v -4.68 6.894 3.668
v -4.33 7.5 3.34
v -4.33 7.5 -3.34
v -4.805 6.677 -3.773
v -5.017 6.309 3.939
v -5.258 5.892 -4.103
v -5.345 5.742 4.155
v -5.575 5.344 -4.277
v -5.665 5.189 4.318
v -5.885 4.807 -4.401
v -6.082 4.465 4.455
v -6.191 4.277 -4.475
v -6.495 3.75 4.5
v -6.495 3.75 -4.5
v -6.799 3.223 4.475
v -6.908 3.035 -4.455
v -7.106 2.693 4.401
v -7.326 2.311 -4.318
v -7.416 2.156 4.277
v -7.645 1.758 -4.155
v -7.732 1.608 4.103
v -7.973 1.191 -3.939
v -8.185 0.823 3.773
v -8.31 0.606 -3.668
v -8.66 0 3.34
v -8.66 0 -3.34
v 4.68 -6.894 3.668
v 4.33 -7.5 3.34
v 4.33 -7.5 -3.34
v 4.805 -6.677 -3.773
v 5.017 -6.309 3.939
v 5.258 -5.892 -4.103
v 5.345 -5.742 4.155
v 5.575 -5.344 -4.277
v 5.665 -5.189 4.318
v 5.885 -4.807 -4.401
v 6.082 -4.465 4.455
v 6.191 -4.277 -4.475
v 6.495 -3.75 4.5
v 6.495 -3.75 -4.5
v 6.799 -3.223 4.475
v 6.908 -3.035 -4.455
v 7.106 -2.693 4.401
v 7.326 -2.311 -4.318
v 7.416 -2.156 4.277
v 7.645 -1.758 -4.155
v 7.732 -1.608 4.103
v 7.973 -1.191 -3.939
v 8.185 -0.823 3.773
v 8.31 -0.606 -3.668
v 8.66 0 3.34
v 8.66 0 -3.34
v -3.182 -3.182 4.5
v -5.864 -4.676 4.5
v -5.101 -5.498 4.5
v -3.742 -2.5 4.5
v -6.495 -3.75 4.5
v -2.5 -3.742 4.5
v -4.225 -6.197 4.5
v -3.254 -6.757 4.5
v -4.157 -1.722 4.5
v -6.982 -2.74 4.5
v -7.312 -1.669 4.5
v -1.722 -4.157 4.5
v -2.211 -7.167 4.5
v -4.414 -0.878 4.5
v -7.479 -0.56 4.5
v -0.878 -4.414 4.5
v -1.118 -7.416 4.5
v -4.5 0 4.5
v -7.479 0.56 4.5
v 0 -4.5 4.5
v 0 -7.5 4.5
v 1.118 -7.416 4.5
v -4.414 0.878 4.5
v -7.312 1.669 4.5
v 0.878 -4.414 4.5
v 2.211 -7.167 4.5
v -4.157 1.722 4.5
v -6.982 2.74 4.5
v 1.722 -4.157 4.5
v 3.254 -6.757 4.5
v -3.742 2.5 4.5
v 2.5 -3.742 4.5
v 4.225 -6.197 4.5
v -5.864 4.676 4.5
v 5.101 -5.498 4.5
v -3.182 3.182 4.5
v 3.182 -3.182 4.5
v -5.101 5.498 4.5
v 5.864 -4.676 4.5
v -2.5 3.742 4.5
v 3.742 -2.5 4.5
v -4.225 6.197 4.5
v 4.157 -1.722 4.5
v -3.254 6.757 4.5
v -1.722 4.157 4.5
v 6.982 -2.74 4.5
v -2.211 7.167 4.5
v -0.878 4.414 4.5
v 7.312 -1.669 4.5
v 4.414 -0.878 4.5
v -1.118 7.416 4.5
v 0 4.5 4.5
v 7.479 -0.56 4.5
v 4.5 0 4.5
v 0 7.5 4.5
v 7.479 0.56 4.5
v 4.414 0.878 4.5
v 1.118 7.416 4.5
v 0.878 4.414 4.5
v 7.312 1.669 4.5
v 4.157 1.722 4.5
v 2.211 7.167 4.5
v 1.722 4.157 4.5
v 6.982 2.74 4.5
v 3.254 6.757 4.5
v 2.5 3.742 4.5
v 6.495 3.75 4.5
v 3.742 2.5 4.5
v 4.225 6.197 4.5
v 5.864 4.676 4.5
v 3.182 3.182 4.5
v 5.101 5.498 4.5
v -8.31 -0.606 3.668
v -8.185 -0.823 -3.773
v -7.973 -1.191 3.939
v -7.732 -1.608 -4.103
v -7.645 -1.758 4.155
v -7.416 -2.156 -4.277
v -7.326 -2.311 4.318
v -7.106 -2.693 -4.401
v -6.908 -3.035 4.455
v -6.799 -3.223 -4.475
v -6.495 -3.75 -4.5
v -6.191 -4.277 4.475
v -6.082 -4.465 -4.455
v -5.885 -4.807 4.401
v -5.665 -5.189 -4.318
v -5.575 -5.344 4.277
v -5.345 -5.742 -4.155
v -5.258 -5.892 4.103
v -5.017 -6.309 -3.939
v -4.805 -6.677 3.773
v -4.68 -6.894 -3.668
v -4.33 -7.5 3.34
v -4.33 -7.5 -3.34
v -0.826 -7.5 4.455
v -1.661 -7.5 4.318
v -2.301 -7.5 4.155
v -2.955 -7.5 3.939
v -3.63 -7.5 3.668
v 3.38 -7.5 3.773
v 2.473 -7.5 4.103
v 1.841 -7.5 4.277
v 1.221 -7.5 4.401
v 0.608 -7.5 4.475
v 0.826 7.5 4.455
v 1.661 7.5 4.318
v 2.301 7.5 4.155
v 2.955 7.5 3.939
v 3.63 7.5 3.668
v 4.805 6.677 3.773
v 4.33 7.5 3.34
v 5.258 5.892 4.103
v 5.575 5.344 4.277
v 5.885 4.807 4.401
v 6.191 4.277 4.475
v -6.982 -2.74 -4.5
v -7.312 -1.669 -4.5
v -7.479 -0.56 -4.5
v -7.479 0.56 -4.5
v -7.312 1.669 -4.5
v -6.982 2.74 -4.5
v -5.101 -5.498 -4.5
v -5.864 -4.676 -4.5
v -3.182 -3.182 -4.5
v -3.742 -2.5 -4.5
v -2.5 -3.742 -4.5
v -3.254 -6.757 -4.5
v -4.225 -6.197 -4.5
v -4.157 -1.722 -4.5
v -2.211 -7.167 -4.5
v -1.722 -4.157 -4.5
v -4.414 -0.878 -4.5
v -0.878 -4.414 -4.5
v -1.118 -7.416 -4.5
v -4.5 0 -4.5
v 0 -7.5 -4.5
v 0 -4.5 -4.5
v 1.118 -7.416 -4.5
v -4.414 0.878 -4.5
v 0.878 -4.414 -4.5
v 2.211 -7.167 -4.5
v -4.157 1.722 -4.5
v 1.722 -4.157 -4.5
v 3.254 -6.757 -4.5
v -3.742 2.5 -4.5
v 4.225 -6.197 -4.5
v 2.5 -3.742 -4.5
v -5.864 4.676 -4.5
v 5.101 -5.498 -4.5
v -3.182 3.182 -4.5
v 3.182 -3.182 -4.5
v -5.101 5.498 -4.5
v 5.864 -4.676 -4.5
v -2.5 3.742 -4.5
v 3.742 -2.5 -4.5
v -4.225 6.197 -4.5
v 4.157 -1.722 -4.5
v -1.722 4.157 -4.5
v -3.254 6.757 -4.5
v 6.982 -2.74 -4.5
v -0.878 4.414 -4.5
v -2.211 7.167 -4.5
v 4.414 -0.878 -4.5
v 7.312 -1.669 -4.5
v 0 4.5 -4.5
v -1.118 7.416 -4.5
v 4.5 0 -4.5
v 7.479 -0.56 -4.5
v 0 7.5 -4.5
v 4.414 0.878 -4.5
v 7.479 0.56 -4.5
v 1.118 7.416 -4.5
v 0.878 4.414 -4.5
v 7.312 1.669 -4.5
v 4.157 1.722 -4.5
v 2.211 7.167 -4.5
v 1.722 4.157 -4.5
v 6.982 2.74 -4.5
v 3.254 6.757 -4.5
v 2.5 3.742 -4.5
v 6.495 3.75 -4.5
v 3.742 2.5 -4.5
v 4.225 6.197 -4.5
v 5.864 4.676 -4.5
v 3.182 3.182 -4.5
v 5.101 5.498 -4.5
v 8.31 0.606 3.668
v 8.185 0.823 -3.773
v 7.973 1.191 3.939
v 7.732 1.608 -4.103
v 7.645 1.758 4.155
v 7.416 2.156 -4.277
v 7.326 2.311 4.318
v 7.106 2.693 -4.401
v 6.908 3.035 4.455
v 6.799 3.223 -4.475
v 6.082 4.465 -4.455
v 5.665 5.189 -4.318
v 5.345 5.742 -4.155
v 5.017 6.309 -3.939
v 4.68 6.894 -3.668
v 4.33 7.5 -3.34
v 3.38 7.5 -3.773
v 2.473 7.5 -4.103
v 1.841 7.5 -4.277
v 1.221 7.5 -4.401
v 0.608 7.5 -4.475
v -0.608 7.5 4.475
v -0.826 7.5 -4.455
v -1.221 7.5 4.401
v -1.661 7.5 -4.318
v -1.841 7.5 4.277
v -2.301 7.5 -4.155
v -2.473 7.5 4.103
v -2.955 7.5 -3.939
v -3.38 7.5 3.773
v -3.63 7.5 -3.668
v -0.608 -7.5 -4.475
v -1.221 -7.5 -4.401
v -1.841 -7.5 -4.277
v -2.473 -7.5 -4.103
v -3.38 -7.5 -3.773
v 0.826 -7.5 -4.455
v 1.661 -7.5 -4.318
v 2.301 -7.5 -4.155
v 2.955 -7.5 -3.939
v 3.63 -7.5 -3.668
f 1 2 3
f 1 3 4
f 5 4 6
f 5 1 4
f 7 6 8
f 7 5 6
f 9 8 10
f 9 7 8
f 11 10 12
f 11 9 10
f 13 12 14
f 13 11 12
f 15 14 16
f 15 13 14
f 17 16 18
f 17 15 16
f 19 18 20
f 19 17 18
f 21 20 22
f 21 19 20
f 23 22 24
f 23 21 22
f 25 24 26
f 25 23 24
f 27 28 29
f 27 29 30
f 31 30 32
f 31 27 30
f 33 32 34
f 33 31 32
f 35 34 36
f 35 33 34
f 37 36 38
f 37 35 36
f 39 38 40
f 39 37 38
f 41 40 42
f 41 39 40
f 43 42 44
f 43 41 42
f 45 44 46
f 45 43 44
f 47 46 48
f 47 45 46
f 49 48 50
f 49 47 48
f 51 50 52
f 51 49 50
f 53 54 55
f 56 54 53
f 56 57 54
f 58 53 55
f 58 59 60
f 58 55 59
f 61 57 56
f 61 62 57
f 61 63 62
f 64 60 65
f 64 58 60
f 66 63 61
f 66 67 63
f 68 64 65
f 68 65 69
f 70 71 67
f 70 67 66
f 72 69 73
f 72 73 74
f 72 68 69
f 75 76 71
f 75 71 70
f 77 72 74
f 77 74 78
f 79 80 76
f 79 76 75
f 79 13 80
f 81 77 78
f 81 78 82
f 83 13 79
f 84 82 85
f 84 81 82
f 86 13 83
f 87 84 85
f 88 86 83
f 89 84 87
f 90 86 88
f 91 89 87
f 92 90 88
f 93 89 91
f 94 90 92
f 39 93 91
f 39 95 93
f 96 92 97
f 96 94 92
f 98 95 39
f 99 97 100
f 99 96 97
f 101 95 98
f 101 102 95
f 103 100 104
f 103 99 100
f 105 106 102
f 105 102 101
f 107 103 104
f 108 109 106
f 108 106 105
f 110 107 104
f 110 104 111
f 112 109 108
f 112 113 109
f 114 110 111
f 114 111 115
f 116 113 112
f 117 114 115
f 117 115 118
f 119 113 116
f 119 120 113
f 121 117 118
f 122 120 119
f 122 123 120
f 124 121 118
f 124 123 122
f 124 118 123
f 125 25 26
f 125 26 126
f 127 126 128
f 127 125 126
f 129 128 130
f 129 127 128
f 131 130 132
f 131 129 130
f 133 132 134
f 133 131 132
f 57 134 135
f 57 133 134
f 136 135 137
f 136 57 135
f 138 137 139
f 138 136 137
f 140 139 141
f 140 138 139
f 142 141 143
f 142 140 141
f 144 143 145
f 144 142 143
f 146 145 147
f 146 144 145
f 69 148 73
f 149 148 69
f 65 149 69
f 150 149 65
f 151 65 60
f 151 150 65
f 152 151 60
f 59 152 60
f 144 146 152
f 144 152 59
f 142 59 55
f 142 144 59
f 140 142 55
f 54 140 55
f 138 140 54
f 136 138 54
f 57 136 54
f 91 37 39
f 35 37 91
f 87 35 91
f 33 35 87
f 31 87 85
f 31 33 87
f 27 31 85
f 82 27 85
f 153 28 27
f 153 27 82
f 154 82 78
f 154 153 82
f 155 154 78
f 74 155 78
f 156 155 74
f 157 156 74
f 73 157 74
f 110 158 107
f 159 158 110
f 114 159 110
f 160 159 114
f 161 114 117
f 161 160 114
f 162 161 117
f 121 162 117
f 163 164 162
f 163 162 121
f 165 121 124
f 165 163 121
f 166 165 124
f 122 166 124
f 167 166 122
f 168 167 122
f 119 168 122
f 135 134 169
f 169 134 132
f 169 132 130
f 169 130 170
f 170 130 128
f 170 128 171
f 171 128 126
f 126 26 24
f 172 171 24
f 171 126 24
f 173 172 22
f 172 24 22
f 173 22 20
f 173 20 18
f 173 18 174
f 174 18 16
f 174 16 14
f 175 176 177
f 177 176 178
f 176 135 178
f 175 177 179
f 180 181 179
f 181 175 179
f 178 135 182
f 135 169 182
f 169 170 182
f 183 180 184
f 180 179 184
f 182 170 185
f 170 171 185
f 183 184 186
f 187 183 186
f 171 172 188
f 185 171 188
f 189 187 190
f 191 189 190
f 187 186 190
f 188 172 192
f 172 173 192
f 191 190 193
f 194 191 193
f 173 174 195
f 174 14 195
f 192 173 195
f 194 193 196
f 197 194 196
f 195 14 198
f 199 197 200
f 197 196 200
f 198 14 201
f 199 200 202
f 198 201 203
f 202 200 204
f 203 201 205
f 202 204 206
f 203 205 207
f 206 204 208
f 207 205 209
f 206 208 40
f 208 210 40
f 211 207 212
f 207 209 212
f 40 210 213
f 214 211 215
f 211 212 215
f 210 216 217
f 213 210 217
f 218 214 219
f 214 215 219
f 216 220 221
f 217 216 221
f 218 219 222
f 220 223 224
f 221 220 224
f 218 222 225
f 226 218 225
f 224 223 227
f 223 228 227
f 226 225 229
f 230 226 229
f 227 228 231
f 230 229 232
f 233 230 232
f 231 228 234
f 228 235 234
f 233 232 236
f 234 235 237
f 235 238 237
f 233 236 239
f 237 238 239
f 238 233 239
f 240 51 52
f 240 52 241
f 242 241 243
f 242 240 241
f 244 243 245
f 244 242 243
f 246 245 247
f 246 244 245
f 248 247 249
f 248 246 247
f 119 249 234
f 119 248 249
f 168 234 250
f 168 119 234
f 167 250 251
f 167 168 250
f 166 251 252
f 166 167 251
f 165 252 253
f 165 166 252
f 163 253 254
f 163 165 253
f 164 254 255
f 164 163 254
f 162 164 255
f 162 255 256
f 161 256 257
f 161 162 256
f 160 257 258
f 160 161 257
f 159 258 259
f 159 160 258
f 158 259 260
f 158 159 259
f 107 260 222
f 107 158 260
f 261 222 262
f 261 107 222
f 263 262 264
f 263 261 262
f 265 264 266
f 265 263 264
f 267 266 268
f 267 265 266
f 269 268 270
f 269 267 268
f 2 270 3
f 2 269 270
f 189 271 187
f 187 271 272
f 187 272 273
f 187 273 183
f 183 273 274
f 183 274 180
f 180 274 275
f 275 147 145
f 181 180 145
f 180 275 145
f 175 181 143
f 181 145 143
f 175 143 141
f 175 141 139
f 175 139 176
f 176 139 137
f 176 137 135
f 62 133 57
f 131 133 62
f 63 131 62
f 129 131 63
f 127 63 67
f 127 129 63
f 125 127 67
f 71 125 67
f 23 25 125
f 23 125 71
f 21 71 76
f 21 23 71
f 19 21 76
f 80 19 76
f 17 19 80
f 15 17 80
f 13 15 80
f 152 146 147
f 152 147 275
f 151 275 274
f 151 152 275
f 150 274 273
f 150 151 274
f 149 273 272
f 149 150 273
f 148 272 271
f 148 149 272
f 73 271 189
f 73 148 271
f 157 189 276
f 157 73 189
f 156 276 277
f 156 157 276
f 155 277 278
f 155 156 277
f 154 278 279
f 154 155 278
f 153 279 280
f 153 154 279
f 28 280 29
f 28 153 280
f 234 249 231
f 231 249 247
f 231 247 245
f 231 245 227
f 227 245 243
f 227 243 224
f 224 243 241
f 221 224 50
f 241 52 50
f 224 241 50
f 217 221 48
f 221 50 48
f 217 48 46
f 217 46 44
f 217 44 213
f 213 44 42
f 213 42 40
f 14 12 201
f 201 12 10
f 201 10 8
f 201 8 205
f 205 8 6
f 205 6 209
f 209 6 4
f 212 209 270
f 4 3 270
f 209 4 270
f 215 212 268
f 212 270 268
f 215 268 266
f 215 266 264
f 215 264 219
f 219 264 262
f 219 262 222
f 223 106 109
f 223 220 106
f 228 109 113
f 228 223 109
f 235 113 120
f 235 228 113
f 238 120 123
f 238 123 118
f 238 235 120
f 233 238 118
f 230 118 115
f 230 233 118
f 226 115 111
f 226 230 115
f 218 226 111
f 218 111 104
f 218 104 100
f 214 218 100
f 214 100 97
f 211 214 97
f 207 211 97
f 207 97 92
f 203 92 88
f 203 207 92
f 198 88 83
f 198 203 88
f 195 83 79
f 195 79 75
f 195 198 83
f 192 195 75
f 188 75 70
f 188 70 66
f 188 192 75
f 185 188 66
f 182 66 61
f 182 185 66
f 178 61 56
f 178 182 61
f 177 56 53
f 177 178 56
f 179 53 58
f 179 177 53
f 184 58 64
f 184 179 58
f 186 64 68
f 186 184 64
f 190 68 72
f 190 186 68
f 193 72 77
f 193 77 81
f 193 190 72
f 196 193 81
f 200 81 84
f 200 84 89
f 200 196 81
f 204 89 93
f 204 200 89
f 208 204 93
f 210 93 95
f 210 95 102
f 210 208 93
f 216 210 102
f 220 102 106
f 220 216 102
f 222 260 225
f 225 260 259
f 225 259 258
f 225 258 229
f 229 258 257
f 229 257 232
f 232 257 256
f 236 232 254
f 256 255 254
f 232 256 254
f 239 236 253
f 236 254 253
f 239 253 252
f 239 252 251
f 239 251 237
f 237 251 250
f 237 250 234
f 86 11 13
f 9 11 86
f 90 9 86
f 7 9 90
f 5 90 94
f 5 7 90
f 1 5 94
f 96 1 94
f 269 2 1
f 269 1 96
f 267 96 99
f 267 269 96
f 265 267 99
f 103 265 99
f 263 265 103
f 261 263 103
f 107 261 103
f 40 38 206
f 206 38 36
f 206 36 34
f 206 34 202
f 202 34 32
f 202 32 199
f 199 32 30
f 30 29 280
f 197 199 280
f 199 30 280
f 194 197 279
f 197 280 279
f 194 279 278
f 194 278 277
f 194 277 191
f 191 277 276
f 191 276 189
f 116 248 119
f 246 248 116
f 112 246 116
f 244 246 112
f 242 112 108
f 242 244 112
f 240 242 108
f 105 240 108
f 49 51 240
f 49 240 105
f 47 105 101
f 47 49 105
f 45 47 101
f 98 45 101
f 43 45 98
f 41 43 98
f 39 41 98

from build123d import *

# Parameters (mm, degrees)
SKETCH1_R           = 4.5
BOSS_EXTRUDE2_DEPTH = 4.5
SKETCH4_OUTSIDE_W   = 42.244
SKETCH4_OUTSIDE_H   = 39.924
SKETCH4_OUTSIDE_R   = 7.5
CUT_EXTRUDE2_DEPTH  = 9
CUT_EXTRUDE2_TAPER  = 45


with BuildPart() as part:
    # Sketch1 → Boss-Extrude2 (new body, symmetric)
    with BuildSketch(Plane.XY):
        Polygon((-4.330127019, 7.5), (-8.660254038, 0), (-4.330127019, -7.5), (4.330127019, -7.5), (8.660254038, 0), (4.330127019, 7.5), align=None)
        Circle(SKETCH1_R, mode=Mode.SUBTRACT)
    extrude(amount=BOSS_EXTRUDE2_DEPTH, both=True)

    # Sketch4 outside → Cut-Extrude2 (cut)
    with BuildSketch(Plane.XY.offset(4.5)):
        Rectangle(SKETCH4_OUTSIDE_W, SKETCH4_OUTSIDE_H)
        Circle(SKETCH4_OUTSIDE_R, mode=Mode.SUBTRACT)
    cut_extrude2 = extrude(amount=-CUT_EXTRUDE2_DEPTH, taper=CUT_EXTRUDE2_TAPER, mode=Mode.SUBTRACT)

    # Mirror3: Cut-Extrude2 across plane
    add(cut_extrude2.mirror(Plane.XY), mode=Mode.SUBTRACT)


solid = part.part
